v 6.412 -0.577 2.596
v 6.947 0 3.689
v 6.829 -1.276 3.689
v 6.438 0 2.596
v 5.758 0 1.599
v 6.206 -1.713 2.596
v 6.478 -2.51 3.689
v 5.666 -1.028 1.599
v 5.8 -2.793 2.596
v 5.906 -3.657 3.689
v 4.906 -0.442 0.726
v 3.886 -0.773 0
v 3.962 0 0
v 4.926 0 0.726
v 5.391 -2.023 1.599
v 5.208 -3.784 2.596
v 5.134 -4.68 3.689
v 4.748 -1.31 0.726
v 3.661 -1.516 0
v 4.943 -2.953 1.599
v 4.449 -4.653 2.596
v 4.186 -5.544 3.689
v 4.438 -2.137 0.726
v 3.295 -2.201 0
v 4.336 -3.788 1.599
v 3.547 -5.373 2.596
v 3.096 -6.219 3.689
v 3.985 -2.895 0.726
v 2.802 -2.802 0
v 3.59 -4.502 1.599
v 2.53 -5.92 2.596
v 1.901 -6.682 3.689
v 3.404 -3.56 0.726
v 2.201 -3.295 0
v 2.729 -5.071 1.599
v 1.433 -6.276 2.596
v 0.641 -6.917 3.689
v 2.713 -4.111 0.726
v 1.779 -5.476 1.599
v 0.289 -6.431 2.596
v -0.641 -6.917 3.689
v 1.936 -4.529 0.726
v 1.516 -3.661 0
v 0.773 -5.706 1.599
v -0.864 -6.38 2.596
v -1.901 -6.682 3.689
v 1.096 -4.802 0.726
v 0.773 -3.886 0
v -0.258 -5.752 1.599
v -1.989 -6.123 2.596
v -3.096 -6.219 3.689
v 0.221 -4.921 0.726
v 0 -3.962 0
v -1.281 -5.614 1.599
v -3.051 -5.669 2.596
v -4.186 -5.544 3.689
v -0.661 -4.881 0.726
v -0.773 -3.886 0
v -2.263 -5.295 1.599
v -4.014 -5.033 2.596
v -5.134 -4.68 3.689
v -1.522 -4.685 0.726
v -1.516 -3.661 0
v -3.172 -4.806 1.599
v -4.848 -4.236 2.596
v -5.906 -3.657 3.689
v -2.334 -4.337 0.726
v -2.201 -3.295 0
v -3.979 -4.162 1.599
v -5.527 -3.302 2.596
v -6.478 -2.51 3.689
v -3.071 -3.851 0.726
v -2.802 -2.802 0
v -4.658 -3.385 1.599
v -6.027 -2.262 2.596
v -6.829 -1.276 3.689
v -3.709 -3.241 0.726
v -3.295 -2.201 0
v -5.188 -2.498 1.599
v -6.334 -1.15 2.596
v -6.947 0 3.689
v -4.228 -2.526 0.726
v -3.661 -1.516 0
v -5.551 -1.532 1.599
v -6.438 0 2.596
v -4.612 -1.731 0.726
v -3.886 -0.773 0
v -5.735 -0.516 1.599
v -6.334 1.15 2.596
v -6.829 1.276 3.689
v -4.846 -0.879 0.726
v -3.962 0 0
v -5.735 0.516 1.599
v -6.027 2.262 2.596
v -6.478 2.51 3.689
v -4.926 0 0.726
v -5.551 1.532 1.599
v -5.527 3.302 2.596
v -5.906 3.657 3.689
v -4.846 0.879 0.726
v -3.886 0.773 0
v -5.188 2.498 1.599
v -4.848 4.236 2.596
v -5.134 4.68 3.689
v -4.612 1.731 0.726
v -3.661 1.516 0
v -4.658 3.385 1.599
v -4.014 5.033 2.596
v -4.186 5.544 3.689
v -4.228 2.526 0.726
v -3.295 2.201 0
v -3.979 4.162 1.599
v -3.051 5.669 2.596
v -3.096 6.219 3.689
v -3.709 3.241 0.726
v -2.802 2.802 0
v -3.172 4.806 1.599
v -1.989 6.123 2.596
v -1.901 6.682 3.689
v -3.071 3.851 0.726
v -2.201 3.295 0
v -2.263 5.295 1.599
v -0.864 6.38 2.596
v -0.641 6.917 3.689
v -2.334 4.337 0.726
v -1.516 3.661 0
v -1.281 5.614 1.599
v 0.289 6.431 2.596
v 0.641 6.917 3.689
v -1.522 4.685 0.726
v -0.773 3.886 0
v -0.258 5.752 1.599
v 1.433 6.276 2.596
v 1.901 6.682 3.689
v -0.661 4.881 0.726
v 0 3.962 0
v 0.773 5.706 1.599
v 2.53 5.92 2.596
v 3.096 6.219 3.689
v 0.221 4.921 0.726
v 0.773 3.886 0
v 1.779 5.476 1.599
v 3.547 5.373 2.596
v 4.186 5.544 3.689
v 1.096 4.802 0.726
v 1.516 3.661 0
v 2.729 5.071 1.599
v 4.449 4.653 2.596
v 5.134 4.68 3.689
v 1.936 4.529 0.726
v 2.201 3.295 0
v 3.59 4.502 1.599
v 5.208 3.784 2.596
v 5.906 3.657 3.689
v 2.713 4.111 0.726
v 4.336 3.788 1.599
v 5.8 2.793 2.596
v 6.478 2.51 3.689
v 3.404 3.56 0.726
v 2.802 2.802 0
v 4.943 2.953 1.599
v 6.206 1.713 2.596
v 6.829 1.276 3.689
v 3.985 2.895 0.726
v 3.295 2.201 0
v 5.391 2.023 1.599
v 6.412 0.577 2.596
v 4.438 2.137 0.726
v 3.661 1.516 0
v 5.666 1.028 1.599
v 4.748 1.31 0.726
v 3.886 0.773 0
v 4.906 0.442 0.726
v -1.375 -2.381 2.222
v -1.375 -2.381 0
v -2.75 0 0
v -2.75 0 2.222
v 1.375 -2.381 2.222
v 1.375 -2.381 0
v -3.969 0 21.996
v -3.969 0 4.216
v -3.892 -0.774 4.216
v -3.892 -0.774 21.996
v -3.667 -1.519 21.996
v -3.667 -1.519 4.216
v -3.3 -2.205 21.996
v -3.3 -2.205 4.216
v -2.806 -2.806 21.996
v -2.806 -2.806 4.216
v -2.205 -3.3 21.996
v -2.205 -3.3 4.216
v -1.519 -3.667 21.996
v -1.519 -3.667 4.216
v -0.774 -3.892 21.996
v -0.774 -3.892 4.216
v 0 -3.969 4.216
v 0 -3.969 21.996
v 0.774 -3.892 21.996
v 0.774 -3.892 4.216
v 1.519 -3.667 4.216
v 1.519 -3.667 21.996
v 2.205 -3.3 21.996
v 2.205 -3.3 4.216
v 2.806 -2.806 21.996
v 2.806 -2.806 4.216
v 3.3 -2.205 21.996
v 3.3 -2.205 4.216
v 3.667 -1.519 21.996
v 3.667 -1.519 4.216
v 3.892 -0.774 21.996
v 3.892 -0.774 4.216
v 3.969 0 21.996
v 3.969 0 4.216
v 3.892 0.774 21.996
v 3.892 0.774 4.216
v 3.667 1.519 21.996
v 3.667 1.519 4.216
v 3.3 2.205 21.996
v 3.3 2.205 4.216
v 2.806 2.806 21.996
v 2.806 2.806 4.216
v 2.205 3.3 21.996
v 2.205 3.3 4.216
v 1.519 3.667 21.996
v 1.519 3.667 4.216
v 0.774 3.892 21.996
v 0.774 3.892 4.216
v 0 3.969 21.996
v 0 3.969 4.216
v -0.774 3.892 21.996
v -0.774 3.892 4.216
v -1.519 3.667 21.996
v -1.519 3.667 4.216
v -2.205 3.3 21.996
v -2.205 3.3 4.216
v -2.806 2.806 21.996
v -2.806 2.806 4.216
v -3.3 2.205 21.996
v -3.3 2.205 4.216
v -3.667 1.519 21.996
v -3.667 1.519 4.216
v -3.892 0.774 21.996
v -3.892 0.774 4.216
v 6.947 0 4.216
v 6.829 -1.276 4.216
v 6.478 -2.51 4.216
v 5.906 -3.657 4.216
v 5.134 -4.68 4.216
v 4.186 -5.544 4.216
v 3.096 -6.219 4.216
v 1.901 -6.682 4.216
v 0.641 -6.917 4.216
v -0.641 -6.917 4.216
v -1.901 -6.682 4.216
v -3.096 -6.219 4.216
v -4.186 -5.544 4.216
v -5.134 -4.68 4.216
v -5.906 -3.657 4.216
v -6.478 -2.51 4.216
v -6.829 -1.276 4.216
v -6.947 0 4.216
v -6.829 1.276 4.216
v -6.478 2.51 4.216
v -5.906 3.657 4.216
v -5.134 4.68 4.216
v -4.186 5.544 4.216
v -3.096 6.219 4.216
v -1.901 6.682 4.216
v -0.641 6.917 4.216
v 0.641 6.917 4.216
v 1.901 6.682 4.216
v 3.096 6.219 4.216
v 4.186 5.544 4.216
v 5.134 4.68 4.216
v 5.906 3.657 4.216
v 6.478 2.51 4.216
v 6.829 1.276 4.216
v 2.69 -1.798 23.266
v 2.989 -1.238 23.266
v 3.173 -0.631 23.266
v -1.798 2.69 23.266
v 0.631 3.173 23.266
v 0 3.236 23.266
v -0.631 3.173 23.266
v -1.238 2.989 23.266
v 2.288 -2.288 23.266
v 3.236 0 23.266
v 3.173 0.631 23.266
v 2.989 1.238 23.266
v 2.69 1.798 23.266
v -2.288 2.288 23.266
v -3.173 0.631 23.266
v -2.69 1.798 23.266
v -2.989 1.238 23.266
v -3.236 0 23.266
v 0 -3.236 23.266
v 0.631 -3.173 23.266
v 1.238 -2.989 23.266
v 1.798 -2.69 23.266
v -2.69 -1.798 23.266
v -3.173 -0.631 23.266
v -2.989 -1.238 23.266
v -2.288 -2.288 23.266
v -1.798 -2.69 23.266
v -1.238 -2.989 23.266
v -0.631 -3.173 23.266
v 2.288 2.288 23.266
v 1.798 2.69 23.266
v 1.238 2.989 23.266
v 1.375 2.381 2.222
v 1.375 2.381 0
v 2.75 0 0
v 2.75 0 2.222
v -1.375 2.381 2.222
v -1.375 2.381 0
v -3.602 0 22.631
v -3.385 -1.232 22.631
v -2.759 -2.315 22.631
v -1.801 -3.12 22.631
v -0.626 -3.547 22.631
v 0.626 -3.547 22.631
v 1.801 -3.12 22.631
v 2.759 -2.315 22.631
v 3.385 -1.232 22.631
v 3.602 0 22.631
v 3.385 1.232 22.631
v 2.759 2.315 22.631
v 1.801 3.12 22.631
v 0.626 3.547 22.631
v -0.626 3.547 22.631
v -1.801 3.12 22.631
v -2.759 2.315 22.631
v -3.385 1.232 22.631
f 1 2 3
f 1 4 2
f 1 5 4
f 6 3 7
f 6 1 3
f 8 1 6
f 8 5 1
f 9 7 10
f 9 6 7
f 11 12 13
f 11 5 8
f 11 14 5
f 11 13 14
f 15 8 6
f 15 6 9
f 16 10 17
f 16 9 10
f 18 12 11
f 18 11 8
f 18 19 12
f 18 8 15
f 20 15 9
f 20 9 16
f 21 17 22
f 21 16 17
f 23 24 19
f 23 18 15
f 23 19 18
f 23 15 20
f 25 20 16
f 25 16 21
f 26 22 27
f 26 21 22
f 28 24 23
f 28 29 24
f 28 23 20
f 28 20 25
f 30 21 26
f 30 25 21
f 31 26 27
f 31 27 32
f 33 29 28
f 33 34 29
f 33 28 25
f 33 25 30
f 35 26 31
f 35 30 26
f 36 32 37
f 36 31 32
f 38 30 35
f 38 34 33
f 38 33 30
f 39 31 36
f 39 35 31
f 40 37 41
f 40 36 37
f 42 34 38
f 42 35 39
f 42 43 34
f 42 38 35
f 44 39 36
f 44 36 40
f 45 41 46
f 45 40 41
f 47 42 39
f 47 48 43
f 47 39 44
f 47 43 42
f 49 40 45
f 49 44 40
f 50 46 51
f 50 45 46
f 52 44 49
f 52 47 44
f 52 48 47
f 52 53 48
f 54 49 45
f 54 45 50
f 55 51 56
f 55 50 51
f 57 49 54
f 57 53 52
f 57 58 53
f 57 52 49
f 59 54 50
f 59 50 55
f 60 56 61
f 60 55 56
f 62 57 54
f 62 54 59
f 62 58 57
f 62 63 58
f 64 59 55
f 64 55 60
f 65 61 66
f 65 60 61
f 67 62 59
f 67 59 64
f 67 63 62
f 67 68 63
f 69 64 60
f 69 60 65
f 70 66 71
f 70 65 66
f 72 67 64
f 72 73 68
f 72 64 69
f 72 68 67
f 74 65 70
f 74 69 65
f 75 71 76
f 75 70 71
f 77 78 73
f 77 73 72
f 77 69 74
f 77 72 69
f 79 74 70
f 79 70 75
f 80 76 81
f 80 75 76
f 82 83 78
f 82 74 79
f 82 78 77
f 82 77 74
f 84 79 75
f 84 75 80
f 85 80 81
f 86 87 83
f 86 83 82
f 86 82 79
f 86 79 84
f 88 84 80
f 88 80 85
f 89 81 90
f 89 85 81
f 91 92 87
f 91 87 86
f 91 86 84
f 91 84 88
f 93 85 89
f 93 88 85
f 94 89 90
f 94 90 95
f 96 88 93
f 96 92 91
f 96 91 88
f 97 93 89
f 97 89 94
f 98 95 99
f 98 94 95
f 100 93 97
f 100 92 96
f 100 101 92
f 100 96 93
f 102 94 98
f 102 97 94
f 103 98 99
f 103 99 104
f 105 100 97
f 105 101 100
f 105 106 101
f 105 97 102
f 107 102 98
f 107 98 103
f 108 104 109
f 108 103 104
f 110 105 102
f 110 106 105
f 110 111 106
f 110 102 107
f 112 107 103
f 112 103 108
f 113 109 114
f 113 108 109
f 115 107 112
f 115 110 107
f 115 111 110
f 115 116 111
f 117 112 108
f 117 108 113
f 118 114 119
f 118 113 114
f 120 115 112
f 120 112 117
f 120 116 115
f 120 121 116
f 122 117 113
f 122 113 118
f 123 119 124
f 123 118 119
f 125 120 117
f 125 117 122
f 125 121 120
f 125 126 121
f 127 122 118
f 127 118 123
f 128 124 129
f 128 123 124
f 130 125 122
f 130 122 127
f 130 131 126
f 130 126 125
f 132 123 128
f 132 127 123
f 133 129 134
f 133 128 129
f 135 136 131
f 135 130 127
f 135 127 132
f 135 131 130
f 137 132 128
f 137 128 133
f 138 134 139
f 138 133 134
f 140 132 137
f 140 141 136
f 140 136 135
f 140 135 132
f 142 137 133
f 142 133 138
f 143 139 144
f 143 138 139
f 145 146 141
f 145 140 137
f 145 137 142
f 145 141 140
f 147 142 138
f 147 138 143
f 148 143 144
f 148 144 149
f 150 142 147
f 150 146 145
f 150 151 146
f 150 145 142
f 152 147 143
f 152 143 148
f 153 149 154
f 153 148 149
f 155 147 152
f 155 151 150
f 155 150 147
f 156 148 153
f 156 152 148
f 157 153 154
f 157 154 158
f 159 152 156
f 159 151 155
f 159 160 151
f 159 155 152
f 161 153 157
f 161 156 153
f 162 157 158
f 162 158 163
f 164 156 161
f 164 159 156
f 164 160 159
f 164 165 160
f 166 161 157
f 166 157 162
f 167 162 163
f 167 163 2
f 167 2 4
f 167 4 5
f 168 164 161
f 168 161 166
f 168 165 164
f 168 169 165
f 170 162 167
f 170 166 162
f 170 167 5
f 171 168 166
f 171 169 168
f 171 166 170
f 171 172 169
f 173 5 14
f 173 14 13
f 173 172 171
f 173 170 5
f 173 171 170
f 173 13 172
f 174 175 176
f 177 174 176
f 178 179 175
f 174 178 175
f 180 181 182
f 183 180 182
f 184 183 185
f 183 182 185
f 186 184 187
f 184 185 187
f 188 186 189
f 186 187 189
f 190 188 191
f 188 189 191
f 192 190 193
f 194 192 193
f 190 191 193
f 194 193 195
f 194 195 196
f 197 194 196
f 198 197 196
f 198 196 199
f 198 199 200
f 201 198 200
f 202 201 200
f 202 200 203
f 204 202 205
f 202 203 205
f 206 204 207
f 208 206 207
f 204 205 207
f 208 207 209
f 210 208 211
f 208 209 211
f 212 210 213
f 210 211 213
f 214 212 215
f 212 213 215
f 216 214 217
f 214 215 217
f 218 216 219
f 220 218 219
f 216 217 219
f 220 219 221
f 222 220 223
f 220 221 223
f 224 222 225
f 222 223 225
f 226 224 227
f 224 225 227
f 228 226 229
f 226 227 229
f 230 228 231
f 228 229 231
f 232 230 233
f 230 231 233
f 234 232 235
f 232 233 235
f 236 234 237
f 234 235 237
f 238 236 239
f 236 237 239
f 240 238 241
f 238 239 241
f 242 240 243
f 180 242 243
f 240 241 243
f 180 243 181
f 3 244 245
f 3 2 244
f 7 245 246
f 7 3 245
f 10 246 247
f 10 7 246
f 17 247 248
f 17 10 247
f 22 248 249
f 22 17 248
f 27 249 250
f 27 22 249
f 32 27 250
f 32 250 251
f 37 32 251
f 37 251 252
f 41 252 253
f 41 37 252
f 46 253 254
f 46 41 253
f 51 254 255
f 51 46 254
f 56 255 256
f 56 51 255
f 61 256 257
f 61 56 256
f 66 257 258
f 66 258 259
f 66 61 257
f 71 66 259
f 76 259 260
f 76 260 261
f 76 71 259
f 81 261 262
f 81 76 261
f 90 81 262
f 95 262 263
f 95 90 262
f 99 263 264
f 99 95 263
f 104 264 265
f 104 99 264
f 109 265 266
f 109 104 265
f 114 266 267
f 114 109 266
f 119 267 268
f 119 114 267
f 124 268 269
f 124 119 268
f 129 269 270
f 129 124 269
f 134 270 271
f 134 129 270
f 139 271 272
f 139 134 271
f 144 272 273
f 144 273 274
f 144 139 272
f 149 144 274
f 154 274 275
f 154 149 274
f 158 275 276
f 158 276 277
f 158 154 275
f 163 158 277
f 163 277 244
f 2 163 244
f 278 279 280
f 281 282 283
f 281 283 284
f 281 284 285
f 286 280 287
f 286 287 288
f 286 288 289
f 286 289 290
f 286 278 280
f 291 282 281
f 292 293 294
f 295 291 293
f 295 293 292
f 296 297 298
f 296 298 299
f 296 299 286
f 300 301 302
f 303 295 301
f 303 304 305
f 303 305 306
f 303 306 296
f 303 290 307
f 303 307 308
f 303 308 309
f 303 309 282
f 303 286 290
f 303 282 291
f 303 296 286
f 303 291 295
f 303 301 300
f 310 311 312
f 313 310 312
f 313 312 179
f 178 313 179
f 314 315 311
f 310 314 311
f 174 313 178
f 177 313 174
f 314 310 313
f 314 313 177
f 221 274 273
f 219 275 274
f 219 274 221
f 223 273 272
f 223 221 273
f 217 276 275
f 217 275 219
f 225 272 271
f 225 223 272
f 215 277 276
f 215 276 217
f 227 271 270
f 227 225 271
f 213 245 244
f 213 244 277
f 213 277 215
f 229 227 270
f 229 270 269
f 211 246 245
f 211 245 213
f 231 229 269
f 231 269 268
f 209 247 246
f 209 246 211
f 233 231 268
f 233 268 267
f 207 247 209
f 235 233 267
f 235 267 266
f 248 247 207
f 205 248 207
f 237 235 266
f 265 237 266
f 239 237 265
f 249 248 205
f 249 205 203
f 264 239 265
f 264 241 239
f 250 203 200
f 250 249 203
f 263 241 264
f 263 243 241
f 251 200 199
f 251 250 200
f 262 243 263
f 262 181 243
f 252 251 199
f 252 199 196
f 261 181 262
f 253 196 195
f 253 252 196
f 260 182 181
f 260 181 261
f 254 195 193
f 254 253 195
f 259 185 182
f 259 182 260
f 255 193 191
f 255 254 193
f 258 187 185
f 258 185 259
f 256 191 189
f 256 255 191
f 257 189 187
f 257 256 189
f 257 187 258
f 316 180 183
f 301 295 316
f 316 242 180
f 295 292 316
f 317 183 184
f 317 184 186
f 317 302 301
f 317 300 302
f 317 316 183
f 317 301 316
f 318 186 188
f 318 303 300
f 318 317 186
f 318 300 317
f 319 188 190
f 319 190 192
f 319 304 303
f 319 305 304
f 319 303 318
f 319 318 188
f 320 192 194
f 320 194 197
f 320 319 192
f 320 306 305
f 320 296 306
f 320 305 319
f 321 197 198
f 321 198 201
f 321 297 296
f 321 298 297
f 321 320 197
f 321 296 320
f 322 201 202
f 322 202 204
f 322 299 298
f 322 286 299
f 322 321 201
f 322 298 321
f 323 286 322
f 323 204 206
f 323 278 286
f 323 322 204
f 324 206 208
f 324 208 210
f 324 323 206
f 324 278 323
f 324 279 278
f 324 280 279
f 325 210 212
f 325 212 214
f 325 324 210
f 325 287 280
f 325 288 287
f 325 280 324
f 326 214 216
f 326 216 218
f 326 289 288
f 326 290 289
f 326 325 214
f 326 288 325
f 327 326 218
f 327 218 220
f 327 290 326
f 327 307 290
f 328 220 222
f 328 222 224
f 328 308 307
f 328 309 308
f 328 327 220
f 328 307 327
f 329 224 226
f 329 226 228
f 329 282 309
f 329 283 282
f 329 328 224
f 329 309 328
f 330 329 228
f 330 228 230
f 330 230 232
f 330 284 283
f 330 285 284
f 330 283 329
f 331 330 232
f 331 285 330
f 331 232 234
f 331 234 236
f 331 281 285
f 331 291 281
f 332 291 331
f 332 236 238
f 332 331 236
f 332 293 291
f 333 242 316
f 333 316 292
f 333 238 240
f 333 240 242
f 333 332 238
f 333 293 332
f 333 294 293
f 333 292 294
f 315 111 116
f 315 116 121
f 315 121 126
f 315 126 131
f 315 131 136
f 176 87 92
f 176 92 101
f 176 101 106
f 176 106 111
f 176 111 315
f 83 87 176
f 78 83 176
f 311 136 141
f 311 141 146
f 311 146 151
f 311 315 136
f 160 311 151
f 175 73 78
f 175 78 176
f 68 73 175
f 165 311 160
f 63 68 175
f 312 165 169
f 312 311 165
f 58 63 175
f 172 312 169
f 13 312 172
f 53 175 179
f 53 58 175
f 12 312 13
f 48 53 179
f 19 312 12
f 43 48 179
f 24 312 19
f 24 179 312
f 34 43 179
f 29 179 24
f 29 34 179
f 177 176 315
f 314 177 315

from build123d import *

# Parameters (mm, degrees)
CUT_EXTRUDE1_DEPTH  = 2.2225
SKETCH3_R           = 3.96875
BOSS_EXTRUDE1_DEPTH = 19.05
CHAMFER1_SIZE       = 1.27
CHAMFER1_SIZE2      = 0.733234842


with BuildPart() as part:
    # Sketch1 → Revolve1 (revolve)
    with BuildSketch(Plane(origin=(0, 0, 0), x_dir=(1, 0, 0), z_dir=(0, 1, 0))):
        with BuildLine():
            Line((6.946899945, -4.2164), (6.946899945, -3.689349932))
            ThreePointArc((6.946899945, -3.689349932), (5.758127461, -1.59917681), (3.962399967, 0))
            Line((3.962399967, 0), (-2.8e-08, 0))
            Line((-2.8e-08, 0), (-2.8e-08, -4.2164))
            Line((-2.8e-08, -4.2164), (6.946899945, -4.2164))
        make_face()
    revolve(axis=Axis((-2.8e-08, 0, 0), (0, 0, -1)))

    # Sketch2 → Cut-Extrude1 (cut)
    with BuildSketch(Plane(origin=(0, 0, 0), x_dir=(-1, 0, 0), z_dir=(0, 0, -1))):
        Polygon((2.749630657, 0), (1.374815329, 2.38125), (-1.374815329, 2.38125), (-2.749630657, 0), (-1.374815329, -2.38125), (1.374815329, -2.38125), align=None)
    extrude(amount=-CUT_EXTRUDE1_DEPTH, mode=Mode.SUBTRACT)

    # Sketch3 → Boss-Extrude1 (add)
    with BuildSketch(Plane.XY.offset(4.2164)):
        with Locations(Location((0, 0, 0), (0, 0, 180))):
            Circle(SKETCH3_R)
    extrude(amount=BOSS_EXTRUDE1_DEPTH)

    # Chamfer1
    chamfer1_edges = [part.edges().sort_by_distance(p)[0] for p in [
        (3.96875, 0, 23.2664),
    ]]
    chamfer1_side = [part.faces().sort_by_distance(p)[0] for p in [
        (3.96875, 0, 13.7414),
    ]]
    chamfer(chamfer1_edges, length=CHAMFER1_SIZE, length2=CHAMFER1_SIZE2, reference=chamfer1_side[0])


solid = part.part
